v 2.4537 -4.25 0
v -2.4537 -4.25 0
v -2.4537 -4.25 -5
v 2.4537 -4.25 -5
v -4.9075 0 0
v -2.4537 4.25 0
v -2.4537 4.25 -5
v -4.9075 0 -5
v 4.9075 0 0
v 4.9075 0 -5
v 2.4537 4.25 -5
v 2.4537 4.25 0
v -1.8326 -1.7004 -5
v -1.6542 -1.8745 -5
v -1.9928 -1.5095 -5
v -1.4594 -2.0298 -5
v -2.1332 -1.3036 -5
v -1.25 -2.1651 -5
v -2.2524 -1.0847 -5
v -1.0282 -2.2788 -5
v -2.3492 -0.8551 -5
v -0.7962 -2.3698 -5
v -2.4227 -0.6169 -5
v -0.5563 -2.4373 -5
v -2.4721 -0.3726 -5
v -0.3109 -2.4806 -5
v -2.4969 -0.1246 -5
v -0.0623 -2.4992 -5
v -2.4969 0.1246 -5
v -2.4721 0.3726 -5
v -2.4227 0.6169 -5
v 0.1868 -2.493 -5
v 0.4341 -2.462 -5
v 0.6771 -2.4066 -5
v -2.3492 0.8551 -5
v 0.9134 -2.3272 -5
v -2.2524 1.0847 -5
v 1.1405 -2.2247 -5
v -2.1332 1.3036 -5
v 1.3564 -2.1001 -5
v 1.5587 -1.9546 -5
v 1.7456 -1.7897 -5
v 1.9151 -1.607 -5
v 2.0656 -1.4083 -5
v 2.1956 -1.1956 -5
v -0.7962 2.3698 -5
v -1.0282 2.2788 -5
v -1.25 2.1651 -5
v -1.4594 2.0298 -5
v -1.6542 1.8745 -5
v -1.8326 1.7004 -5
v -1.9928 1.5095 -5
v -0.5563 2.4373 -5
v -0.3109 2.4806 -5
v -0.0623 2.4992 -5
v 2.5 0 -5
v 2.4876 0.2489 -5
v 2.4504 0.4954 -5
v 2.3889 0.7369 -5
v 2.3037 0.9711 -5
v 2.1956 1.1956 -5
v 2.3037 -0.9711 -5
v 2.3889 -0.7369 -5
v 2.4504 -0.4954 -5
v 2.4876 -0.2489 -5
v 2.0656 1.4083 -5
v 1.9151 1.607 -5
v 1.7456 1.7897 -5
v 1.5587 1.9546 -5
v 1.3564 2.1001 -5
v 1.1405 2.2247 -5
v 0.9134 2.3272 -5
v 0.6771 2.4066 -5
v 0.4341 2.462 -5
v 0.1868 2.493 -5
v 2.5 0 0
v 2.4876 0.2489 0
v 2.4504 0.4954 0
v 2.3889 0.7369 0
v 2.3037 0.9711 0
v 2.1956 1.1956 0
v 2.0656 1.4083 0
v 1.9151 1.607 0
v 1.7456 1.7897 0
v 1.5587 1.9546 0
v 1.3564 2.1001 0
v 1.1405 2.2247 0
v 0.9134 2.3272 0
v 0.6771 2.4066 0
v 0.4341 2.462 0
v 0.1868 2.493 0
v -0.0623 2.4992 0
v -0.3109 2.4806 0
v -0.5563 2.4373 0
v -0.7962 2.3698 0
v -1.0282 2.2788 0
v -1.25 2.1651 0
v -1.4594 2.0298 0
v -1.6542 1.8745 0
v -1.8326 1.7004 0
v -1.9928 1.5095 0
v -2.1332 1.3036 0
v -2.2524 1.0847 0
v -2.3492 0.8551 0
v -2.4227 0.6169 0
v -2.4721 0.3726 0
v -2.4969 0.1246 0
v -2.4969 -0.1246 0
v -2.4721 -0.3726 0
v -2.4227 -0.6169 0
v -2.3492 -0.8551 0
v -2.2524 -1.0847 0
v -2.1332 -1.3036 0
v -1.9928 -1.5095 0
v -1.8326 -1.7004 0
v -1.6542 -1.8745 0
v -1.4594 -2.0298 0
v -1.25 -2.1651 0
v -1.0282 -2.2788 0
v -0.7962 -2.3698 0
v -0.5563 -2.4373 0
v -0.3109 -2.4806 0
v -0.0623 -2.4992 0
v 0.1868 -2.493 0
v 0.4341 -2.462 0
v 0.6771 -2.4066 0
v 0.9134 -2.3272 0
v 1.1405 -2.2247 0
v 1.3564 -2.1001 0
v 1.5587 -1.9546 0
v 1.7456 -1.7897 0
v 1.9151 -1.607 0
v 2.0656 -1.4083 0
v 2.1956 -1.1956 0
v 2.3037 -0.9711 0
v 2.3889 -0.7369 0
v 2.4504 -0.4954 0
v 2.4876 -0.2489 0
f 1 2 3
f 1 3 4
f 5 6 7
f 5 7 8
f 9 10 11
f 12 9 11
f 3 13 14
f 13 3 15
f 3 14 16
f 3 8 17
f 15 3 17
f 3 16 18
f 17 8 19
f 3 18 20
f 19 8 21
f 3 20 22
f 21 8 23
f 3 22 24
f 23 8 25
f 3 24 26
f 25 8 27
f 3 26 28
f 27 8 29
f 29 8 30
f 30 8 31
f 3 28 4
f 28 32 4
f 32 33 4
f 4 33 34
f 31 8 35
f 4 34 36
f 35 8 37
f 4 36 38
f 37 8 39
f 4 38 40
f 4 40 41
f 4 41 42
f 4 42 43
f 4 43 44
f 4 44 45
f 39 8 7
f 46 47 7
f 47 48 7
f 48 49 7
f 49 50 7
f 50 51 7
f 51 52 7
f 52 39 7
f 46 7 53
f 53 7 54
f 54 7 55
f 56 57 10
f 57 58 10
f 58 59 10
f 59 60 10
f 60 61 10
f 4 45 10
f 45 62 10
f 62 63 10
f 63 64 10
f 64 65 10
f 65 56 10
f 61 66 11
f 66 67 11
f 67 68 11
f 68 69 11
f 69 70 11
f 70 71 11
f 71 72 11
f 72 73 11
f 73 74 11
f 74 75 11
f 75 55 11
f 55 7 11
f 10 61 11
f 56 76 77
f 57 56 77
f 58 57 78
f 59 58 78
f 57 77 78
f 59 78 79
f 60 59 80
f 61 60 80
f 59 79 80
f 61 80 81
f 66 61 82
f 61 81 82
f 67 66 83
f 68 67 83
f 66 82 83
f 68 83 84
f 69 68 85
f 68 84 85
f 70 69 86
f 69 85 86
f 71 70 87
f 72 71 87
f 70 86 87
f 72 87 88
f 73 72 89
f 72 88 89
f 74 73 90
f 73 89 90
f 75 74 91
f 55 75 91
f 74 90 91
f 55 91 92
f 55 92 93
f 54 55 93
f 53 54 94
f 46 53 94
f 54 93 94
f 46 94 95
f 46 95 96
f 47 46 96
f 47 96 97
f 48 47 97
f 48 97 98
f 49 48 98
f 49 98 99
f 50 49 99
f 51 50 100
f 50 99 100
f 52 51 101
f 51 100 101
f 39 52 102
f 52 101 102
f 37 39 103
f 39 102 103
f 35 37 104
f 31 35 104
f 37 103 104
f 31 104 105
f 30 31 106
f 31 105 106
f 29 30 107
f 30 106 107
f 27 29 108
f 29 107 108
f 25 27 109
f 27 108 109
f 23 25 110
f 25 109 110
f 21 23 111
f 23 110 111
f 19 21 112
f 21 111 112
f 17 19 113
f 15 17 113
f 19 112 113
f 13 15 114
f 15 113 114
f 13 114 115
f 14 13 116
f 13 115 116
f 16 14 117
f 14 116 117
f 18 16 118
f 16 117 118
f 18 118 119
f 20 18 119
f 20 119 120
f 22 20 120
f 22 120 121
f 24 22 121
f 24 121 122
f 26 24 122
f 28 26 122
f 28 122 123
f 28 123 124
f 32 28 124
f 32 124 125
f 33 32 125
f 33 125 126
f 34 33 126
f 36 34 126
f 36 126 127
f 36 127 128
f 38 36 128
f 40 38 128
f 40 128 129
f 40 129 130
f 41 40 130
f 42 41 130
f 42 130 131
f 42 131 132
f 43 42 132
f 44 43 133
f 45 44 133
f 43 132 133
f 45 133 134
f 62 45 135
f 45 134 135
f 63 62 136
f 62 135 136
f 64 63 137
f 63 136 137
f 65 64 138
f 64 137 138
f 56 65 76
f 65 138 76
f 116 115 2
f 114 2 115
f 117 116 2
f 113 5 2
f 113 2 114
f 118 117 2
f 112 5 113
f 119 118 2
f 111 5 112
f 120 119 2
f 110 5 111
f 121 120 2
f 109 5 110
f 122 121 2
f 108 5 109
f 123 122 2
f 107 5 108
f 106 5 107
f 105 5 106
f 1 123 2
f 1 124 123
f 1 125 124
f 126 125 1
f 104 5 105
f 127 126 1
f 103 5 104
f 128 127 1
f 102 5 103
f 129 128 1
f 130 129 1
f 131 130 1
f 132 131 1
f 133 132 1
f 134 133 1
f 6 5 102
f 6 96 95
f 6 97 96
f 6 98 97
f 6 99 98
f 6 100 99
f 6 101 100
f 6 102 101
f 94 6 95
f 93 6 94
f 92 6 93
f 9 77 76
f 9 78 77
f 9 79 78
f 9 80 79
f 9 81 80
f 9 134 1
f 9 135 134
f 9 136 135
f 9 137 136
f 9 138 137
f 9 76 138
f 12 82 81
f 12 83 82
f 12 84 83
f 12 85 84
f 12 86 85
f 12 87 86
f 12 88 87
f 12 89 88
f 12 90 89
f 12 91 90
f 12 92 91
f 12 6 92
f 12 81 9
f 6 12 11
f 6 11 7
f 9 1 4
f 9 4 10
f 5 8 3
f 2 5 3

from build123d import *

# Parameters (mm, degrees)
SKETCH1_R           = 2.5
BOSS_EXTRUDE3_DEPTH = 5


with BuildPart() as part:
    # Sketch1 → Boss-Extrude3 (new body)
    with BuildSketch(Plane.XY):
        Polygon((4.907477288, 0), (2.453738644, 4.25), (-2.453738644, 4.25), (-4.907477288, 0), (-2.453738644, -4.25), (2.453738644, -4.25), align=None)
        Circle(SKETCH1_R, mode=Mode.SUBTRACT)
    extrude(amount=-BOSS_EXTRUDE3_DEPTH)


solid = part.part
